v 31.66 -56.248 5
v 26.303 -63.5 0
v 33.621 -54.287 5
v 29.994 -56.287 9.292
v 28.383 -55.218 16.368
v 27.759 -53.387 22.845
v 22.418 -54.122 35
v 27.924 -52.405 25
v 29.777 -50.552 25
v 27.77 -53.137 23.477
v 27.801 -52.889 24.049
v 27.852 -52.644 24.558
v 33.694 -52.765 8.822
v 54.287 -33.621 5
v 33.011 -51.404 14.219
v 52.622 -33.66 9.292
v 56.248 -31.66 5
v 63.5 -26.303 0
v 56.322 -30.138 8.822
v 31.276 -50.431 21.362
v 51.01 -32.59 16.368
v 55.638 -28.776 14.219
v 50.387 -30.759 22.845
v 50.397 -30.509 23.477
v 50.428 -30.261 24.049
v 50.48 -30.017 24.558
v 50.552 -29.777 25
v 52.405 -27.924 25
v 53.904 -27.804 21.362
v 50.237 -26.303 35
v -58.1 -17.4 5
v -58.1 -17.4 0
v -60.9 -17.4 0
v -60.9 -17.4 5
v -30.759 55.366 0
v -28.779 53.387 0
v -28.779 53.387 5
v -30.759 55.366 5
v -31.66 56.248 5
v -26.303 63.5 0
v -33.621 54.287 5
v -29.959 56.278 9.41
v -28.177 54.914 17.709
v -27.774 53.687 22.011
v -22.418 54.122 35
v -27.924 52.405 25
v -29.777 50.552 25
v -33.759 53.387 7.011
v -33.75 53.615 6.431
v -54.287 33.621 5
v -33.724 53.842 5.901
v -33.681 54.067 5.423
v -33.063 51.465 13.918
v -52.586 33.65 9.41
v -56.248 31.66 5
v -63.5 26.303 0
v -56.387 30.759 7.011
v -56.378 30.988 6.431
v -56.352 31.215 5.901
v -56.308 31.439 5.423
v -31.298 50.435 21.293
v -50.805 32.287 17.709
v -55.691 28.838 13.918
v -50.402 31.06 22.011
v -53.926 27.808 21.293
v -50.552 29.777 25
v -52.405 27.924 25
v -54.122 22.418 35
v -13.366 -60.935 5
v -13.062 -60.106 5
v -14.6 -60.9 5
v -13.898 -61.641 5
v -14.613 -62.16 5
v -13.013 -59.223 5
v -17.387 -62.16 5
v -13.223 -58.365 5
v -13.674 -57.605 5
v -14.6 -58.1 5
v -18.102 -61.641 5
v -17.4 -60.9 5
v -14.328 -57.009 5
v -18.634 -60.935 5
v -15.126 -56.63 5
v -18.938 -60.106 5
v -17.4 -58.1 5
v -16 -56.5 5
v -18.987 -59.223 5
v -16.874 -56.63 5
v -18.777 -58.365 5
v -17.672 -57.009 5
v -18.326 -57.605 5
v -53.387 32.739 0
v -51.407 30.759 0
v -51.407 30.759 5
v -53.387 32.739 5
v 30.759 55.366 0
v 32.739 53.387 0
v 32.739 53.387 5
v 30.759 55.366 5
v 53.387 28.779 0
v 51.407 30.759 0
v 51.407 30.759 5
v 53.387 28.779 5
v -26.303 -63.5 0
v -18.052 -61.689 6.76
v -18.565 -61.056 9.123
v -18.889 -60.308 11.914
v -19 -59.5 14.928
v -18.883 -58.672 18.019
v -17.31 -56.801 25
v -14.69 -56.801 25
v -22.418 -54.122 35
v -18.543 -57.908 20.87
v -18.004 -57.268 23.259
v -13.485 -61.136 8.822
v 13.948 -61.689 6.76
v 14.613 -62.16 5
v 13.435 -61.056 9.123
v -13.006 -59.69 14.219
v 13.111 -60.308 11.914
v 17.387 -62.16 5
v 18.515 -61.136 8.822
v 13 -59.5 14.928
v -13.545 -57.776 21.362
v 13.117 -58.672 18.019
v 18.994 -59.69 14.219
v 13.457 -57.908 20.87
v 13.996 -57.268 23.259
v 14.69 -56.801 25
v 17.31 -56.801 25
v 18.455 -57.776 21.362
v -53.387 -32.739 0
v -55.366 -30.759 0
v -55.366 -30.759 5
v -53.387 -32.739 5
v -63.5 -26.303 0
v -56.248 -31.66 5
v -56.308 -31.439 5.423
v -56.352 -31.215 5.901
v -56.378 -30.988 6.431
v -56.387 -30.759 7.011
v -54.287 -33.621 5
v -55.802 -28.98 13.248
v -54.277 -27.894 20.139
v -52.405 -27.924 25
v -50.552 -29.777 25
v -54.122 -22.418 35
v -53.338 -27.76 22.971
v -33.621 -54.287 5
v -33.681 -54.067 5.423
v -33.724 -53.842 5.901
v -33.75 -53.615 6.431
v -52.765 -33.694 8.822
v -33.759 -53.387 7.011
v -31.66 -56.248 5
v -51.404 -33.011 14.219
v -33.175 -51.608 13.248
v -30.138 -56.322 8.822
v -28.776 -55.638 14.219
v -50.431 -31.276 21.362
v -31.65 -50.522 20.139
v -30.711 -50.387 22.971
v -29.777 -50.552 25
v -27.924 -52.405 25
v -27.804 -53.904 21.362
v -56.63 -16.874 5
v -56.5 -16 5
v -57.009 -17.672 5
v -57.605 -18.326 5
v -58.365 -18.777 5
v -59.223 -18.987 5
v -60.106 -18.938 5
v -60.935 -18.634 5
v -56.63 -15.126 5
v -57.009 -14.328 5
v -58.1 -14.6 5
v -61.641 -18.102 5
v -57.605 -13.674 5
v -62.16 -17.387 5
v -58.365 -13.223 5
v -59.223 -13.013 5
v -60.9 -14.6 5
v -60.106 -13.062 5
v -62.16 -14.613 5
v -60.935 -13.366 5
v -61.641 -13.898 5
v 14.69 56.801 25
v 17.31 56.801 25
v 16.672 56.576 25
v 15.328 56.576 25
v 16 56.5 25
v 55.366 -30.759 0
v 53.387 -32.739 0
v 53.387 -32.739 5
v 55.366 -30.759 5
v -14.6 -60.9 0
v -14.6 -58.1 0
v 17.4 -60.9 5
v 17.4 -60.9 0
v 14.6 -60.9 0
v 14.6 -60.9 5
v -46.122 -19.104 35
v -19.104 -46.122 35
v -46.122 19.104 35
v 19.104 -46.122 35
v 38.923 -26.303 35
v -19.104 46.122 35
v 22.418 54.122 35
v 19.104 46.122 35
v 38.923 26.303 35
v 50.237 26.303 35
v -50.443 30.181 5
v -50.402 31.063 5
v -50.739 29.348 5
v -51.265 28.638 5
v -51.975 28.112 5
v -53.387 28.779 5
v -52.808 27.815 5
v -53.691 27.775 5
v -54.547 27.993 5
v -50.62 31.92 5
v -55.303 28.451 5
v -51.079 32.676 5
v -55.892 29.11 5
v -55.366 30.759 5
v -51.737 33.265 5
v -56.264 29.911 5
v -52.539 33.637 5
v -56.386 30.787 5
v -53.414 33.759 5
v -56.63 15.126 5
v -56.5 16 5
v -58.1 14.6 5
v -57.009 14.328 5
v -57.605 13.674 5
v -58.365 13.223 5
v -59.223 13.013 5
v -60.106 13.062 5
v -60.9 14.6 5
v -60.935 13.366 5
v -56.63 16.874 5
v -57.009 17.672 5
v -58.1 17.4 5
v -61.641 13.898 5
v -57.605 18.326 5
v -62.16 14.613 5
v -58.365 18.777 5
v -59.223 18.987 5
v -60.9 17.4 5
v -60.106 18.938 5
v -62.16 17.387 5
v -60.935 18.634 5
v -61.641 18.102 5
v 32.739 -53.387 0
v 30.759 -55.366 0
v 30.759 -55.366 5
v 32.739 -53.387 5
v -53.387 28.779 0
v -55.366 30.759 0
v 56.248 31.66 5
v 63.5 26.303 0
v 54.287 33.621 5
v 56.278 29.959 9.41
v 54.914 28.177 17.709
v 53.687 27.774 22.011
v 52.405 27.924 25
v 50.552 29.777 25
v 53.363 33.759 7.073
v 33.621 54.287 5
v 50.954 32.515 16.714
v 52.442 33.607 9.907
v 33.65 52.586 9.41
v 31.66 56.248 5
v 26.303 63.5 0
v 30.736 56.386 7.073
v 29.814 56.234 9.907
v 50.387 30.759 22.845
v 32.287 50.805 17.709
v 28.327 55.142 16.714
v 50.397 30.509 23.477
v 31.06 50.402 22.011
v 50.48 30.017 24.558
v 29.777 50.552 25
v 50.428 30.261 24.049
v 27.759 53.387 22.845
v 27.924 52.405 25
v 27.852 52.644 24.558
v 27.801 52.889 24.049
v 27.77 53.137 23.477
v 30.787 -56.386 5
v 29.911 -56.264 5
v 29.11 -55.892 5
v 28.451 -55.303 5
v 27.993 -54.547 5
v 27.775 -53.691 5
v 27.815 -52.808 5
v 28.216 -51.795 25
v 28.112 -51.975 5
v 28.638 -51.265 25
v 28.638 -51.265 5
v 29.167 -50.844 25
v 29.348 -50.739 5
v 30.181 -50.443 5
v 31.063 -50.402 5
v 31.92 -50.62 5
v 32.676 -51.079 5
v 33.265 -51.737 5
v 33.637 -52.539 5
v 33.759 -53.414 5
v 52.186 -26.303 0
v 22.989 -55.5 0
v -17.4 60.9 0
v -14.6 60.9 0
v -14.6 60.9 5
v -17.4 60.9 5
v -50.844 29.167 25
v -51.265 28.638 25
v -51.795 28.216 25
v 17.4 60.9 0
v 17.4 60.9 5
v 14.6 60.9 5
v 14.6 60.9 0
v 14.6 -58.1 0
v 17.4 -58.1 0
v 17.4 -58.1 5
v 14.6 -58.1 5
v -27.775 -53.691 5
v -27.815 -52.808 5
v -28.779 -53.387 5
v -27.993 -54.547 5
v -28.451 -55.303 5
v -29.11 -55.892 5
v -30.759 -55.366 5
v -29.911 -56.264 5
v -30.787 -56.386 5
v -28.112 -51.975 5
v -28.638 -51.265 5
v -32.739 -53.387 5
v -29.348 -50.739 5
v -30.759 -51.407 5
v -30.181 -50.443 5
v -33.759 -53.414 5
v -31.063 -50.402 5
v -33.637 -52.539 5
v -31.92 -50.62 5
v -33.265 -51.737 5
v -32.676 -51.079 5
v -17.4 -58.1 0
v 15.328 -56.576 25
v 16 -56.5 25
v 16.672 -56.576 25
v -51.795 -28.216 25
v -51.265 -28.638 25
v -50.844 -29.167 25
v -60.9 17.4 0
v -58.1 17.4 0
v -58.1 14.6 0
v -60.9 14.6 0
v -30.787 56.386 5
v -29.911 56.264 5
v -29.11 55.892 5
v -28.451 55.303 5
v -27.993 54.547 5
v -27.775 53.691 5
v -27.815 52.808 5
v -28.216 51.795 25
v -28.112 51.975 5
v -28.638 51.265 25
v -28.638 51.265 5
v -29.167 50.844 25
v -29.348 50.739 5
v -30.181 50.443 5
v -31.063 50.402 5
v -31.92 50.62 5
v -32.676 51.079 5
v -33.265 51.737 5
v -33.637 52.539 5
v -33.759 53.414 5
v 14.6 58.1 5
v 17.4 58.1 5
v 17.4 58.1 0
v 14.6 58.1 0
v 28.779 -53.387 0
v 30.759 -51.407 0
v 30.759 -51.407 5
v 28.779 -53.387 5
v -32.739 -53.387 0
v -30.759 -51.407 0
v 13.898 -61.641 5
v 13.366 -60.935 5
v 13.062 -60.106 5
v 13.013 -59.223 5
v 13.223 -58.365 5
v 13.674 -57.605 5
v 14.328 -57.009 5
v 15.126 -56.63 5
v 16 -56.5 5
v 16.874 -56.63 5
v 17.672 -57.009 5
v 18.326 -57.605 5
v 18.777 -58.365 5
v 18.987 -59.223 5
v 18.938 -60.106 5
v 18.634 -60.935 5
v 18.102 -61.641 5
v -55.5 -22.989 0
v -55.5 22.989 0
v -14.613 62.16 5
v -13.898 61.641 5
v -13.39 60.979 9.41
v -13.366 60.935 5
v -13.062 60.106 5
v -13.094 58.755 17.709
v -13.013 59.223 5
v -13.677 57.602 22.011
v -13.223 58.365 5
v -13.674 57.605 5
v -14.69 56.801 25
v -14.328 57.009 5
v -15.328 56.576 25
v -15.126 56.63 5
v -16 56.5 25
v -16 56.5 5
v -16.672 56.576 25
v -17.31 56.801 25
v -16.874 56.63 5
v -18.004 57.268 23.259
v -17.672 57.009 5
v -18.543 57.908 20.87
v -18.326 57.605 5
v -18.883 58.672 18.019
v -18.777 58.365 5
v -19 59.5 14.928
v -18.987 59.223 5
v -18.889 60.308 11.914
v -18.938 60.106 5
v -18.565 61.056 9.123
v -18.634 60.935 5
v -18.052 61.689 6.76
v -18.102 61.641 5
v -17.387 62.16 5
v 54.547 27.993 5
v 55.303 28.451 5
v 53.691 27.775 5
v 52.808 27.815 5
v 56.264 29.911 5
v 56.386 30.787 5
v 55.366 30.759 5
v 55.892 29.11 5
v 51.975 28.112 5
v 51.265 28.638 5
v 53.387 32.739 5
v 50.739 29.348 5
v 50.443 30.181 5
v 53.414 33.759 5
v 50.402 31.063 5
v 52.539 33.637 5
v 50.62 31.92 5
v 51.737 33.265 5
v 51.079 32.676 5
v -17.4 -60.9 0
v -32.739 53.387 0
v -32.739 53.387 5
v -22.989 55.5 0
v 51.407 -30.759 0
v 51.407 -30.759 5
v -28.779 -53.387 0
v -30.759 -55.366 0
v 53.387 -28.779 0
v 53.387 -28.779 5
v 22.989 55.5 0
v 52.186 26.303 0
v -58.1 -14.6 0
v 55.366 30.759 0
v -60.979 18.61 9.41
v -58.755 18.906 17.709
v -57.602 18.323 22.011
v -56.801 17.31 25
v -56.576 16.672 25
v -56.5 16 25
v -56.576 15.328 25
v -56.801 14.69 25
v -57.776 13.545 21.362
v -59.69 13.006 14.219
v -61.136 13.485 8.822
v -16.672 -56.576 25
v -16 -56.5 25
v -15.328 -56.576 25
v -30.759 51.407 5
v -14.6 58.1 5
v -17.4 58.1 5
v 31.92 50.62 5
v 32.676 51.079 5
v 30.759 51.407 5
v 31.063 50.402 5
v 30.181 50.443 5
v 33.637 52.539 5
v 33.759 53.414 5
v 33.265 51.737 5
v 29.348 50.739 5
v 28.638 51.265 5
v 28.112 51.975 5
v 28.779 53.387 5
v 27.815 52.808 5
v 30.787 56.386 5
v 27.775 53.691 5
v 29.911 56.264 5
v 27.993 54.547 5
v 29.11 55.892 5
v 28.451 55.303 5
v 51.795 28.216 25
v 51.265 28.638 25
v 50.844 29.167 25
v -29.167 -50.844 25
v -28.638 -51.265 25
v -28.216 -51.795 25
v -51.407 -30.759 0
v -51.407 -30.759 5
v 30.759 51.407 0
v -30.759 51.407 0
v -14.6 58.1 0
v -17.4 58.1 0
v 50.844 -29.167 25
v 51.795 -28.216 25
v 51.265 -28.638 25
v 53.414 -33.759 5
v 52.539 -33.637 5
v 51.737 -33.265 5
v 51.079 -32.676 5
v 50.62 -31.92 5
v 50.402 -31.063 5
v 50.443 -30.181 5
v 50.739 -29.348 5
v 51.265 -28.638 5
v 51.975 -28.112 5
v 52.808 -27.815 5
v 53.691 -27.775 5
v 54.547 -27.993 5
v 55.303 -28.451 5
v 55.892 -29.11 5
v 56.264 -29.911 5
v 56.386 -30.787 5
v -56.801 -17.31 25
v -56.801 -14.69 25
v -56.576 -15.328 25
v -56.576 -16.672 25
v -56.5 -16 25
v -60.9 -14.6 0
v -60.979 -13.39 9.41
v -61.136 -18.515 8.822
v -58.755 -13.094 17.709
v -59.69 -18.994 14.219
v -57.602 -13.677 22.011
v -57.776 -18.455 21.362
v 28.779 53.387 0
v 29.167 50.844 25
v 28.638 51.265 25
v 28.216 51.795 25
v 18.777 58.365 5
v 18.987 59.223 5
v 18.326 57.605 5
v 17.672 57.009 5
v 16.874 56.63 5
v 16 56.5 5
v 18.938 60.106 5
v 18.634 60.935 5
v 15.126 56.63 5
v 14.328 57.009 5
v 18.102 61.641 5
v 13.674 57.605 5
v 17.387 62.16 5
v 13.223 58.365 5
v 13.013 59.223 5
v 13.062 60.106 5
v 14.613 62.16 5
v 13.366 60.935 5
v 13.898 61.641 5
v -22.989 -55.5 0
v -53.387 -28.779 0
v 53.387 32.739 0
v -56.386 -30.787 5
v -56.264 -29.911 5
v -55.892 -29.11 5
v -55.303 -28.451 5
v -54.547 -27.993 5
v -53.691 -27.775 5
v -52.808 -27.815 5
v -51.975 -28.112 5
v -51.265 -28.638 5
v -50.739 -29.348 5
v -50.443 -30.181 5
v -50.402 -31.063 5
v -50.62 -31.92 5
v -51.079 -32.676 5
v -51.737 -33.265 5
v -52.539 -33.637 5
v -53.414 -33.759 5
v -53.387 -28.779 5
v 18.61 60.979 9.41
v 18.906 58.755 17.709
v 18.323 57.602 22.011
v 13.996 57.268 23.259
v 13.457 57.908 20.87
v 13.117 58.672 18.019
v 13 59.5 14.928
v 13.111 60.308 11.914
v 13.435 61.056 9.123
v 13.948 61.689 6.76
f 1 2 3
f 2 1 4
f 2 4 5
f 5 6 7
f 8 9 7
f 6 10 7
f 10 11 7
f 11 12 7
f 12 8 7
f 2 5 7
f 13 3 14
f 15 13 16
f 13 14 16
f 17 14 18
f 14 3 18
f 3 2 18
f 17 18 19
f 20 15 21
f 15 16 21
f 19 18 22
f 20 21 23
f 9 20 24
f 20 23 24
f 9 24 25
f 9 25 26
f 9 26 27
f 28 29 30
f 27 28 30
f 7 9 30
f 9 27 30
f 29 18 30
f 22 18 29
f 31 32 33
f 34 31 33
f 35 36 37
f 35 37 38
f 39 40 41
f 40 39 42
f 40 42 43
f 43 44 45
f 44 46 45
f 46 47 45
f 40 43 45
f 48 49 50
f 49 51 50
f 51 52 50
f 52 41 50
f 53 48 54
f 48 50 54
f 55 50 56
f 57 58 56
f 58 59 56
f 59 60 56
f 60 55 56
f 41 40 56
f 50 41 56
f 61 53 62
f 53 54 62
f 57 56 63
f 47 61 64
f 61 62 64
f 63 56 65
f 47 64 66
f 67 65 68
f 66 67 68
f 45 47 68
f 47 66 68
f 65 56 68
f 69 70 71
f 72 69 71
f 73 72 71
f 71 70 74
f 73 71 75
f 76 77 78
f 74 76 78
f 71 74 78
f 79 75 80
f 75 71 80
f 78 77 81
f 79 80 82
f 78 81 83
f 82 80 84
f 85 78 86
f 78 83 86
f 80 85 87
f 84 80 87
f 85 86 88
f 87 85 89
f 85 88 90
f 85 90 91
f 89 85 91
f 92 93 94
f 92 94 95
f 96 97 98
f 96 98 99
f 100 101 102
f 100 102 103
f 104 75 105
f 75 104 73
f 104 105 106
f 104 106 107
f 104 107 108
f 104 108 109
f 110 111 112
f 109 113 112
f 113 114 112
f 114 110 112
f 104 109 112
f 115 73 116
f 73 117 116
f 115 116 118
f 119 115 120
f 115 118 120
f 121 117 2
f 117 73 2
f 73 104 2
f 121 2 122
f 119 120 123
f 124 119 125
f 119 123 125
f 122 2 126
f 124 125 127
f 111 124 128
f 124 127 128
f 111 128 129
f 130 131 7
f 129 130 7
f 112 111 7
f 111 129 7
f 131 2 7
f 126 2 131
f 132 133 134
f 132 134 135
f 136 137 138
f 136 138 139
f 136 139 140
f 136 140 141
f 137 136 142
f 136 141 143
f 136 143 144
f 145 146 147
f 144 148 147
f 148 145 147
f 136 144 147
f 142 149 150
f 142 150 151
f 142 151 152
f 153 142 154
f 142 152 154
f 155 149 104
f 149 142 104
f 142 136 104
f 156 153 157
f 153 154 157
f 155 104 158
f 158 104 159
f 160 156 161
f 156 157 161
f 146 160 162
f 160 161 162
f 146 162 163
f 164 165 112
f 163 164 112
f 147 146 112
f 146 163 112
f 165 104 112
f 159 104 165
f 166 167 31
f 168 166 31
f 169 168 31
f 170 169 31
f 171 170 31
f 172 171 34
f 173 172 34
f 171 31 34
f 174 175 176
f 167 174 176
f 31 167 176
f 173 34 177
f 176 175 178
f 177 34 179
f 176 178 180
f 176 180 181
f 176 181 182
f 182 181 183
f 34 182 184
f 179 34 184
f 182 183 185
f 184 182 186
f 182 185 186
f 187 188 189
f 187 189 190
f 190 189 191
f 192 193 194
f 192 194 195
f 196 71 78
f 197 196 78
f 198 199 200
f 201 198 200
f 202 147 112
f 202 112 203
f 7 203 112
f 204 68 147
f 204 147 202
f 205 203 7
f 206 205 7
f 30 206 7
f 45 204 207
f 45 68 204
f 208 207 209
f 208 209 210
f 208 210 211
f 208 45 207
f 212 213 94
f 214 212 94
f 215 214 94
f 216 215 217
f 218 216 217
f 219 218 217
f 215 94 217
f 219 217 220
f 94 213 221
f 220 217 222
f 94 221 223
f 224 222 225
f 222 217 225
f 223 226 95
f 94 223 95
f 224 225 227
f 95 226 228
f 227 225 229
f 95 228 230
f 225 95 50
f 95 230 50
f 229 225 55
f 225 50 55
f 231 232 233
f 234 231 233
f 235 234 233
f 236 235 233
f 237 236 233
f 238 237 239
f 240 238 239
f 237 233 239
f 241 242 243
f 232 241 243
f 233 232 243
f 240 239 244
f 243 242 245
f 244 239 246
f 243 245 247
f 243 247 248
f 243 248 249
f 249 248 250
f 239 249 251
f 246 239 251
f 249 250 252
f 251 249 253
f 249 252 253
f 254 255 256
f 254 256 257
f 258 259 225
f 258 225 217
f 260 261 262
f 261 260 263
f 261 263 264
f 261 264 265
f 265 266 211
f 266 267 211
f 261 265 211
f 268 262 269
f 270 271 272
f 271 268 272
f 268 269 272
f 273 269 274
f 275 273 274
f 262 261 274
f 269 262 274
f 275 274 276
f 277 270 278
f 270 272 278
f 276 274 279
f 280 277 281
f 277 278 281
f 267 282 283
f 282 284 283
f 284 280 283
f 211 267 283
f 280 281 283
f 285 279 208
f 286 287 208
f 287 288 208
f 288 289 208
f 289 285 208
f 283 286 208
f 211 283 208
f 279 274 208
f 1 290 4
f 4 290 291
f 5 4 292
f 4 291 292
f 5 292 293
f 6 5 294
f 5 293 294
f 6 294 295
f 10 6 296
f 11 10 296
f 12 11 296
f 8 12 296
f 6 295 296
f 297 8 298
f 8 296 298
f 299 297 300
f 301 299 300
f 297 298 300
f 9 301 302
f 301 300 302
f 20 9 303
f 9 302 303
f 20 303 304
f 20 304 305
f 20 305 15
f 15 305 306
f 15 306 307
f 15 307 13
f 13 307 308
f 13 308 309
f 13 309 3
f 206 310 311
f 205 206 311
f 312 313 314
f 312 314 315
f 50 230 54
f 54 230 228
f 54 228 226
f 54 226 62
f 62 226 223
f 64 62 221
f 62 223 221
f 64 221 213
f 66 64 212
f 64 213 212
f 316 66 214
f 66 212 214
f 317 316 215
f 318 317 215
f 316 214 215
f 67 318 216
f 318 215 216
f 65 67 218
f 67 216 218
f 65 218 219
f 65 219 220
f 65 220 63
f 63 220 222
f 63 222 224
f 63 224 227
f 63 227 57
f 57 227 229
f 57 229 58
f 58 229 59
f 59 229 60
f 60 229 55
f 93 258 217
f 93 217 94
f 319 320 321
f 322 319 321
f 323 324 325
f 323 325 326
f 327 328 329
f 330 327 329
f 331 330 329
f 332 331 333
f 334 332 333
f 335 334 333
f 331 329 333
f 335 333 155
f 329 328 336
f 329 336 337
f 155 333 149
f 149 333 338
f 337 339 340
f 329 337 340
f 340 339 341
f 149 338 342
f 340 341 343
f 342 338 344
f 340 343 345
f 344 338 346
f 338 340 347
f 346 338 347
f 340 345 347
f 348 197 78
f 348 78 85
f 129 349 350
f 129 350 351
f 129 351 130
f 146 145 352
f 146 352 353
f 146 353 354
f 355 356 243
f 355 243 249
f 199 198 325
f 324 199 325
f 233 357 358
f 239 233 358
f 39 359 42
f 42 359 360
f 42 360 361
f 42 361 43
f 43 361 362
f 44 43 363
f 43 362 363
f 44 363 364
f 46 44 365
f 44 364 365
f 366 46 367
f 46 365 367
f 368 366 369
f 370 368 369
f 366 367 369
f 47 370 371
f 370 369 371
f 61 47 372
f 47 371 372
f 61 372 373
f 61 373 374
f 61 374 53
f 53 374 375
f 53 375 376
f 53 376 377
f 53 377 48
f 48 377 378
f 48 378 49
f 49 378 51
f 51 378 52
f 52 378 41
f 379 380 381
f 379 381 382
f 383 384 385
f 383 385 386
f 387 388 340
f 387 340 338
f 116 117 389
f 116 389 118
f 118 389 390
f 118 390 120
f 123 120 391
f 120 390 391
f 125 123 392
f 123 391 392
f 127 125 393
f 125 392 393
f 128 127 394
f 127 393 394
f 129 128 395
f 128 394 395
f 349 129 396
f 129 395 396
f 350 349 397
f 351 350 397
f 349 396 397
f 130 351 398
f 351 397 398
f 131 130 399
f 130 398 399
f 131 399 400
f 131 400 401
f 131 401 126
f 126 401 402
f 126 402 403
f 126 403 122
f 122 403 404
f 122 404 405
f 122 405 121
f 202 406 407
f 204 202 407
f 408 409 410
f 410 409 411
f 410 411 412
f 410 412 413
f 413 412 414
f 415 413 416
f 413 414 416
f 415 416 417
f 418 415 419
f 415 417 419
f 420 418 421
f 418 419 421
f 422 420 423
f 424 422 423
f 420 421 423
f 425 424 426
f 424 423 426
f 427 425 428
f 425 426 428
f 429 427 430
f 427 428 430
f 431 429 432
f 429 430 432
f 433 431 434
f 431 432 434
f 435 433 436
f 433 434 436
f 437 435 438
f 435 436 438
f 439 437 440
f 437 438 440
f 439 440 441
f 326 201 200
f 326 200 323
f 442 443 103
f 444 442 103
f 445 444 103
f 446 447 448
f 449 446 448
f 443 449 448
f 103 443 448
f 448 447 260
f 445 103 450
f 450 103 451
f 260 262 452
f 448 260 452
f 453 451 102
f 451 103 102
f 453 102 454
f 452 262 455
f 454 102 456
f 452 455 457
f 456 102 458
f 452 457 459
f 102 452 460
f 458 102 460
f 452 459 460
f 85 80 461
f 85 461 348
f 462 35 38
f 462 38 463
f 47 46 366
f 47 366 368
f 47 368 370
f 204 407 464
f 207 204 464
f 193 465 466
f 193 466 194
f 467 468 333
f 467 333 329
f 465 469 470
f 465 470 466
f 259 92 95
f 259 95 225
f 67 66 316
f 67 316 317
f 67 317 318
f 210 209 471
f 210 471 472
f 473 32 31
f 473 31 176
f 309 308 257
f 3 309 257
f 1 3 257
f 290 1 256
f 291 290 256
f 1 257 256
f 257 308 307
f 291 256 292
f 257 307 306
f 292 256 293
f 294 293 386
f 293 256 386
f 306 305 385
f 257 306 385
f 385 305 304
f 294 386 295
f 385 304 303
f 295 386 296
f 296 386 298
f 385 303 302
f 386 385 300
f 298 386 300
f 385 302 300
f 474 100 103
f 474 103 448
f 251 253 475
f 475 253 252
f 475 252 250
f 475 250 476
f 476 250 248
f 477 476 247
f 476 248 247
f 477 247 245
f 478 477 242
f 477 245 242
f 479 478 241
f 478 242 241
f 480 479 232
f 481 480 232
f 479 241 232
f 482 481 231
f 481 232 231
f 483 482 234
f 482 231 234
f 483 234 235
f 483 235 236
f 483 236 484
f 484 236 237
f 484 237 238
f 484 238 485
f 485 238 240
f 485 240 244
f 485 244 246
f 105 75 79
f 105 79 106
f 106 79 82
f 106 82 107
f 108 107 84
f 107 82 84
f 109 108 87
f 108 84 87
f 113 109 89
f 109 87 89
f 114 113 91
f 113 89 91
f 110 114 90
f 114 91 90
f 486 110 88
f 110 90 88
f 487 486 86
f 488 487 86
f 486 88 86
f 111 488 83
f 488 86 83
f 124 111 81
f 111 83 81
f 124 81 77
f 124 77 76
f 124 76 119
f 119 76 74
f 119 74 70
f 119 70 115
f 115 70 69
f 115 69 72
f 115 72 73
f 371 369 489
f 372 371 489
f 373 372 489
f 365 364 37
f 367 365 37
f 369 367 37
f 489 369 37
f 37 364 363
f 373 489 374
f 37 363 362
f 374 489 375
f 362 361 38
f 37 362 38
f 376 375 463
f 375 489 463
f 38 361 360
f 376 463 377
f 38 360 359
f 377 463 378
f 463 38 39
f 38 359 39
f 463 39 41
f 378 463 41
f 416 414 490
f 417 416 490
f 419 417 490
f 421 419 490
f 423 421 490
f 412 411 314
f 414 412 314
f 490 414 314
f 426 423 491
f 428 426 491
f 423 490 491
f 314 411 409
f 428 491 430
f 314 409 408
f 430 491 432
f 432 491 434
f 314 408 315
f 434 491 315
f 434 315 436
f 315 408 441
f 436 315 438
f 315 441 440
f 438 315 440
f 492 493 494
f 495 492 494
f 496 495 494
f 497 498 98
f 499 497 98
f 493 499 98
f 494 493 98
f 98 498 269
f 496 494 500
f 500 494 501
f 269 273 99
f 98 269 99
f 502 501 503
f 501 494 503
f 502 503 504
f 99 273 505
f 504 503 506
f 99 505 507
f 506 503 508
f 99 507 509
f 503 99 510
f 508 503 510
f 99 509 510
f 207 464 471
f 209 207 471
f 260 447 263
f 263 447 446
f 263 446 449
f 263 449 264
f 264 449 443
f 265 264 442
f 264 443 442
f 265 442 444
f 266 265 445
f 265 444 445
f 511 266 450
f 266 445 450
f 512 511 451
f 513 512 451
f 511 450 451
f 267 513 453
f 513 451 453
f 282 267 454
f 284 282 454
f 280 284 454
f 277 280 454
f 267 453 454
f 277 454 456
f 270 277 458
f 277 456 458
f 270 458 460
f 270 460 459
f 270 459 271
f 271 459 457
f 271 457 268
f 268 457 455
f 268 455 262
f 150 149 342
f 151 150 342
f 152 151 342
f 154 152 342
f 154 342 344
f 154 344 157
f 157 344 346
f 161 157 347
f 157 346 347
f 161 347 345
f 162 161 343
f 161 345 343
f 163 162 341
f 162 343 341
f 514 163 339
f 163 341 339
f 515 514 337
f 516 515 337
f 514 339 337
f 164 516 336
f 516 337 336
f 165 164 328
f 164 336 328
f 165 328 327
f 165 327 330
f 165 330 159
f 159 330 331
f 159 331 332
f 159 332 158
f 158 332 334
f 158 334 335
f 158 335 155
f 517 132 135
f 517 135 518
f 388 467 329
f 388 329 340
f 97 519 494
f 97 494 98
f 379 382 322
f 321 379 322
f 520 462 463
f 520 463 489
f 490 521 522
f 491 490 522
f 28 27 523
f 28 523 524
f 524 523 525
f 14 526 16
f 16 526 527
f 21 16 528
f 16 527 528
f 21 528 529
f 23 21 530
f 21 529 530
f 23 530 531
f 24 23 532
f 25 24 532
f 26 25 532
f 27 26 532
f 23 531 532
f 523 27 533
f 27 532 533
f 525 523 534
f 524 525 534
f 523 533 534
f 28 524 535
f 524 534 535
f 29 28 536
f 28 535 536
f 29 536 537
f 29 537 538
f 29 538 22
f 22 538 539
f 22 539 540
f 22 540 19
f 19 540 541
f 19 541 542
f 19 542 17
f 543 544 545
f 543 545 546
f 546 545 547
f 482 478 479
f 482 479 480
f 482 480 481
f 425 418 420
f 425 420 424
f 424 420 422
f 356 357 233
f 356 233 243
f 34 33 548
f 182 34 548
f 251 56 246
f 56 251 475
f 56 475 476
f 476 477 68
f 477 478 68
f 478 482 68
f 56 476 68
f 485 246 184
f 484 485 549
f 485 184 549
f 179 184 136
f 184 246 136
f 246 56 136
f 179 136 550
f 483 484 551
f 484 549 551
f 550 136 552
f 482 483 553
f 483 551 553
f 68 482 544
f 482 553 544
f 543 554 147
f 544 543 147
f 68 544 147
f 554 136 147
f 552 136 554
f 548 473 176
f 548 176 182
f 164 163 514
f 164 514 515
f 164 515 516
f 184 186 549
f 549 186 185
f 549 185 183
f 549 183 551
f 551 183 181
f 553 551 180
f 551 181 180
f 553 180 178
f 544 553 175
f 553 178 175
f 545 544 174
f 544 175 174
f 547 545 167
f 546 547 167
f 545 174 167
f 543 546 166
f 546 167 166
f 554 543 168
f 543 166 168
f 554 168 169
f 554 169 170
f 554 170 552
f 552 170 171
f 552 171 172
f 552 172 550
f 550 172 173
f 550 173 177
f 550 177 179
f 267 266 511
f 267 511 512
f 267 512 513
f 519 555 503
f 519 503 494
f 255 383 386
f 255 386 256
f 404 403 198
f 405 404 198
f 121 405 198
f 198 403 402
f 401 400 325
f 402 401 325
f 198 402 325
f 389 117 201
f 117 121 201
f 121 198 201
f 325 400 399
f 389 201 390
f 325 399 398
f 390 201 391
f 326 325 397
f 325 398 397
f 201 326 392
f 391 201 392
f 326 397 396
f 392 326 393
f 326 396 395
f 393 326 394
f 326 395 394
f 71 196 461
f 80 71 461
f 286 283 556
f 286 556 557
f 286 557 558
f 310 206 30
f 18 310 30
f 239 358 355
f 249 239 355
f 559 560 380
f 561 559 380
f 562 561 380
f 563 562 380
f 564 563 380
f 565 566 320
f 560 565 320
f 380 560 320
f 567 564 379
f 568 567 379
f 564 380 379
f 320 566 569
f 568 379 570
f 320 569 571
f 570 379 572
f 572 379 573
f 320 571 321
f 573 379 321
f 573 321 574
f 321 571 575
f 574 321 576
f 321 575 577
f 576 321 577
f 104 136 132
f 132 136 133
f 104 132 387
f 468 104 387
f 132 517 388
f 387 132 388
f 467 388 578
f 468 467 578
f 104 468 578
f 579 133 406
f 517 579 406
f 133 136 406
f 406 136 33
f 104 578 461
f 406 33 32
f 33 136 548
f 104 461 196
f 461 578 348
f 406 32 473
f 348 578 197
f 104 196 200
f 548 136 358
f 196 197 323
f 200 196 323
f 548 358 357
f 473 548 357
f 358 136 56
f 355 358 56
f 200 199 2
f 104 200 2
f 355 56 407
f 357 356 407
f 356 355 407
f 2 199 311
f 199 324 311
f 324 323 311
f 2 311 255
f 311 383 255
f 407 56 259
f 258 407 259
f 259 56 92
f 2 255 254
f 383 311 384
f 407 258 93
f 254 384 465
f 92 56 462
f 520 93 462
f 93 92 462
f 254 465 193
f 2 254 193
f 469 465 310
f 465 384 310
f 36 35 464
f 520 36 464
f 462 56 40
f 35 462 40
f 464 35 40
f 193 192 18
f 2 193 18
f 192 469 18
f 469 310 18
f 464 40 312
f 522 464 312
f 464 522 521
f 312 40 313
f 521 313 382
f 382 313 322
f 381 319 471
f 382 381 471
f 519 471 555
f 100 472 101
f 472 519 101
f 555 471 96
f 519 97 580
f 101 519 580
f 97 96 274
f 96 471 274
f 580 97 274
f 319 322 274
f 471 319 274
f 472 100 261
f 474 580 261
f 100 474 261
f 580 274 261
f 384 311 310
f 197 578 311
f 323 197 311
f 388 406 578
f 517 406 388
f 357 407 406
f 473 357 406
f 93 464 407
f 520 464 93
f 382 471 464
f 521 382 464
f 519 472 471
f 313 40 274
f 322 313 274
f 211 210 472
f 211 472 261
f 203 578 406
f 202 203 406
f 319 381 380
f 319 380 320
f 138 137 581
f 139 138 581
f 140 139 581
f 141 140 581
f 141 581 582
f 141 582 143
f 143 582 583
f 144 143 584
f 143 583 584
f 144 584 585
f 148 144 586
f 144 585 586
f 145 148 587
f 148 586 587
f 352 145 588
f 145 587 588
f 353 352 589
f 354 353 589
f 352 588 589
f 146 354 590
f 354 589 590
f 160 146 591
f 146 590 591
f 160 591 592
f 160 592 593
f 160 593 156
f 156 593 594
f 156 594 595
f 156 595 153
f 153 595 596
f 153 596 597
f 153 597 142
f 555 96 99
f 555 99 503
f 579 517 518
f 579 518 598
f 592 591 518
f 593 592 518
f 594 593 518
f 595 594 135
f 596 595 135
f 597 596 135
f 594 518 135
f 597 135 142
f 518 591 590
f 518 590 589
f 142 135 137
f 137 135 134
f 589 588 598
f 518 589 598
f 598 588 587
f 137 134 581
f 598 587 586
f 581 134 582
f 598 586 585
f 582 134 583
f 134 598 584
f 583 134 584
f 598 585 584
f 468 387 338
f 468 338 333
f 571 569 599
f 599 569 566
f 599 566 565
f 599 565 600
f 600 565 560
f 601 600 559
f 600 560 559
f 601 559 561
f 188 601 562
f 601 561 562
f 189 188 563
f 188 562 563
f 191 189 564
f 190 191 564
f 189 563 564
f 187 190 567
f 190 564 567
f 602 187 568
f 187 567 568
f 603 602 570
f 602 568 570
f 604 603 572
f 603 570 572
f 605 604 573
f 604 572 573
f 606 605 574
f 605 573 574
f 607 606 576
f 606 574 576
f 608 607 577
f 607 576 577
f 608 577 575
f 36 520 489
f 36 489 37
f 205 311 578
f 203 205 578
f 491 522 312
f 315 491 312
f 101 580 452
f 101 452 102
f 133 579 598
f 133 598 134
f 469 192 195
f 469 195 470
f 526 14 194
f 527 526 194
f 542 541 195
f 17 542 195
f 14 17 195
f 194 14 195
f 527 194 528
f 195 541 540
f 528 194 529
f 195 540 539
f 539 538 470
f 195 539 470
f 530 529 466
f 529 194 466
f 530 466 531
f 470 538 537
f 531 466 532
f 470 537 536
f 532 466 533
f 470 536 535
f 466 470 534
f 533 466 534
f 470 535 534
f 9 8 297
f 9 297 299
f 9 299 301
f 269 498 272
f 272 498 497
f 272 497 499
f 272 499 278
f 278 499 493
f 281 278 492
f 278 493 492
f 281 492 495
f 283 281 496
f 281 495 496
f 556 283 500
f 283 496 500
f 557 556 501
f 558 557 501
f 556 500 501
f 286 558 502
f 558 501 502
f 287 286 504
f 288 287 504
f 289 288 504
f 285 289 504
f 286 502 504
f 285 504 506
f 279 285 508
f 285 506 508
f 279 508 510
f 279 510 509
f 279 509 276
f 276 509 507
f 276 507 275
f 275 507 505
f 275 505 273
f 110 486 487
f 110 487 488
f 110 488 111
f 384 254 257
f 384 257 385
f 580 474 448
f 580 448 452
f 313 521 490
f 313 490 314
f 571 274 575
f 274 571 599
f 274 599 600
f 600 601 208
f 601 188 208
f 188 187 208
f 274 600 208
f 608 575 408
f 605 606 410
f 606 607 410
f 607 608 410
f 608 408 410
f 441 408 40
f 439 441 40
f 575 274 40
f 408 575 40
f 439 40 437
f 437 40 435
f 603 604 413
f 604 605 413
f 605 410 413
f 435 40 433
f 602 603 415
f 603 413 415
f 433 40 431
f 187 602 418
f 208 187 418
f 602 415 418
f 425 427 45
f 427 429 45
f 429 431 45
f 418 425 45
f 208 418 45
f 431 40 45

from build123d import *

# Parameters (mm, degrees)
RESSALTO_EXTRUS_O1_DEPTH = 35
RESSALTO_EXTRUS_O1_TAPER = 15
ESBO_O2_W                = 39.326456566
ESBO_O2_H                = 52.605122422
CORTE_EXTRUS_O1_DEPTH    = 50
ESBO_O5_W                = 2.8
ESBO_O5_H                = 2.8
CORTE_EXTRUS_O2_DEPTH    = 97.382052271
CORTE_EXTRUS_O3_START    = -5
ESBO_O6_R                = 3
CORTE_EXTRUS_O3_DEPTH    = 20
CORTE_EXTRUS_O4_DEPTH    = 35
CORTE_EXTRUS_O4_DRAFT    = -15


with BuildPart() as part:
    # Esboço1 → Ressalto-extrusão1 (new body)
    with BuildSketch(Plane.XY):
        Polygon((63.5, -26.302561211), (63.5, 26.302561211), (26.302561211, 63.5), (-26.302561211, 63.5), (-63.5, 26.302561211), (-63.5, -26.302561211), (-26.302561211, -63.5), (26.302561211, -63.5), align=None)
    extrude(amount=RESSALTO_EXTRUS_O1_DEPTH, taper=RESSALTO_EXTRUS_O1_TAPER)

    # Esboço2 → Corte-extrusão1 (cut)
    with BuildSketch(Plane.XY):
        with Locations((43.836771717, 0)):
            Rectangle(ESBO_O2_W, ESBO_O2_H)
    extrude(amount=CORTE_EXTRUS_O1_DEPTH, mode=Mode.SUBTRACT)

    # Esboço5 → Corte-extrusão2 (cut, through all)
    with BuildSketch(Plane(origin=(0, 0, 0), x_dir=(-1, 0, 0), z_dir=(0, 0, -1))):
        with Locations((-16, 59.5)):
            Rectangle(ESBO_O5_W, ESBO_O5_H)
        Polygon((30.759144982, 55.366460967), (32.739043969, 53.38656198), (30.759144982, 51.406662992), (28.779245994, 53.38656198), align=None)
        with Locations((16, 59.5)):
            Rectangle(ESBO_O5_W, ESBO_O5_H)
        Polygon((53.38656198, 32.739043969), (55.366460967, 30.759144982), (53.38656198, 28.779245994), (51.406662992, 30.759144982), align=None)
        with Locations((59.5, 16)):
            Rectangle(ESBO_O5_W, ESBO_O5_H)
        with Locations((59.5, -16)):
            Rectangle(ESBO_O5_W, ESBO_O5_H)
        Polygon((55.366460967, -30.759144982), (53.38656198, -32.739043969), (51.406662992, -30.759144982), (53.38656198, -28.779245994), align=None)
        Polygon((32.739043969, -53.38656198), (30.759144982, -55.366460967), (28.779245994, -53.38656198), (30.759144982, -51.406662992), align=None)
        with Locations((16, -59.5)):
            Rectangle(ESBO_O5_W, ESBO_O5_H)
        with Locations((-16, -59.5)):
            Rectangle(ESBO_O5_W, ESBO_O5_H)
        Polygon((-30.759144982, -55.366460967), (-32.739043969, -53.38656198), (-30.759144982, -51.406662992), (-28.779245994, -53.38656198), align=None)
        Polygon((-53.38656198, -32.739043969), (-55.366460967, -30.759144982), (-53.38656198, -28.779245994), (-51.406662992, -30.759144982), align=None)
        with Locations((-59.5, -16)):
            Rectangle(ESBO_O5_W, ESBO_O5_H)
        with Locations((-59.5, 16)):
            Rectangle(ESBO_O5_W, ESBO_O5_H)
        Polygon((-55.366460967, 30.759144982), (-53.38656198, 32.739043969), (-51.406662992, 30.759144982), (-53.38656198, 28.779245994), align=None)
        Polygon((-32.739043969, 53.38656198), (-30.759144982, 55.366460967), (-28.779245994, 53.38656198), (-30.759144982, 51.406662992), align=None)
    extrude(amount=-CORTE_EXTRUS_O2_DEPTH, mode=Mode.SUBTRACT)

    # Esboço6 → Corte-extrusão3 (cut)
    with BuildSketch(Plane(origin=(0, 0, 0), x_dir=(-1, 0, 0), z_dir=(0, 0, -1)).offset(CORTE_EXTRUS_O3_START)):
        with Locations((-16, 59.5)):
            Circle(ESBO_O6_R)
        with Locations((16, 59.5)):
            Circle(ESBO_O6_R)
        with Locations((30.759144982, 53.38656198)):
            Circle(ESBO_O6_R)
        with Locations((53.38656198, 30.759144982)):
            Circle(ESBO_O6_R)
        with Locations((59.5, 16)):
            Circle(ESBO_O6_R)
        with Locations((59.5, -16)):
            Circle(ESBO_O6_R)
        with Locations((53.38656198, -30.759144982)):
            Circle(ESBO_O6_R)
        with Locations((30.759144982, -53.38656198)):
            Circle(ESBO_O6_R)
        with Locations((16, -59.5)):
            Circle(ESBO_O6_R)
        with Locations((-16, -59.5)):
            Circle(ESBO_O6_R)
        with Locations((-30.759144982, -53.38656198)):
            Circle(ESBO_O6_R)
        with Locations((-53.38656198, -30.759144982)):
            Circle(ESBO_O6_R)
        with Locations((-59.5, -16)):
            Circle(ESBO_O6_R)
        with Locations((-59.5, 16)):
            Circle(ESBO_O6_R)
        with Locations((-53.38656198, 30.759144982)):
            Circle(ESBO_O6_R)
        with Locations((-30.759144982, 53.38656198)):
            Circle(ESBO_O6_R)
    extrude(amount=-CORTE_EXTRUS_O3_DEPTH, mode=Mode.SUBTRACT)


with BuildPart() as corte_extrus_o4_tool:
    # Esboço9 → Corte-extrusão4 (with draft: the straight prism first)
    with BuildSketch(Plane(origin=(0, 0, 0), x_dir=(-1, 0, 0), z_dir=(0, 0, -1))):
        Polygon((22.988852712, 55.5), (-22.988852712, 55.5), (-55.5, 22.988852712), (-55.5, -22.988852712), (-22.988852712, -55.5), (22.988852712, -55.5), (55.5, -22.988852712), (55.5, 22.988852712), align=None)
    extrude(amount=-CORTE_EXTRUS_O4_DEPTH)
    # Corte-extrusão4: the draft: its side faces are tilted about the plane it starts from
    corte_extrus_o4_sides = [corte_extrus_o4_tool.faces().sort_by_distance(p)[0] for p in [
        (0, 55.5, 17.5),
        (39.244426356, 39.244426356, 17.5),
        (55.5, 0, 17.5),
        (39.244426356, -39.244426356, 17.5),
        (0, -55.5, 17.5),
        (-39.244426356, -39.244426356, 17.5),
        (-55.5, 0, 17.5),
        (-39.244426356, 39.244426356, 17.5),
    ]]
    draft(corte_extrus_o4_sides, Plane(origin=(0, 0, 0), x_dir=(-1, 0, 0), z_dir=(0, 0, -1)), CORTE_EXTRUS_O4_DRAFT)


with BuildPart() as part_1:
    add(part.part)

    # Corte-extrusão4: cut by corte_extrus_o4_tool
    add(corte_extrus_o4_tool.part, mode=Mode.SUBTRACT)


solid = part_1.part
